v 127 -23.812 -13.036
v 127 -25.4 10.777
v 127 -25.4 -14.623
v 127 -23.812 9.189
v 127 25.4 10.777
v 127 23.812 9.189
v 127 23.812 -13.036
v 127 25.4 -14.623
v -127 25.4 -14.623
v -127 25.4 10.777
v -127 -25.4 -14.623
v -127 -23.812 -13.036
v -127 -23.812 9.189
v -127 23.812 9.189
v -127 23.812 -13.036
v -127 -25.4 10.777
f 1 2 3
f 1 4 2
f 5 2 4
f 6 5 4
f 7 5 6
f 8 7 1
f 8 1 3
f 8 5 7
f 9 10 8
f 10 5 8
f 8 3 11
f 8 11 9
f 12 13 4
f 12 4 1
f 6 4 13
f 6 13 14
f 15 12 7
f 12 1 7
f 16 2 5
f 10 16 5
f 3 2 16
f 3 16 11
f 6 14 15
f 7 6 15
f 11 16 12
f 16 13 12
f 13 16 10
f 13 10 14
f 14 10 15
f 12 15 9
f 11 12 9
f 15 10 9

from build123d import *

# Parameters (mm, degrees)
SKETCH1_W           = 25.4
SKETCH1_H           = 50.8
SKETCH1_W_2         = 22.225
SKETCH1_H_2         = 47.625
BOSS_EXTRUDE1_DEPTH = 127


with BuildPart() as part:
    # Sketch1 → Boss-Extrude1 (new, symmetric)
    with BuildSketch(Plane(origin=(0, 0, 0), x_dir=(0, 0, -1), z_dir=(1, 0, 0))):
        with Locations((1.923003206, 0)):
            Rectangle(SKETCH1_W, SKETCH1_H)
        with Locations((1.923003206, 0)):
            Rectangle(SKETCH1_W_2, SKETCH1_H_2, mode=Mode.SUBTRACT)
    extrude(amount=BOSS_EXTRUDE1_DEPTH, both=True)


solid = part.part
